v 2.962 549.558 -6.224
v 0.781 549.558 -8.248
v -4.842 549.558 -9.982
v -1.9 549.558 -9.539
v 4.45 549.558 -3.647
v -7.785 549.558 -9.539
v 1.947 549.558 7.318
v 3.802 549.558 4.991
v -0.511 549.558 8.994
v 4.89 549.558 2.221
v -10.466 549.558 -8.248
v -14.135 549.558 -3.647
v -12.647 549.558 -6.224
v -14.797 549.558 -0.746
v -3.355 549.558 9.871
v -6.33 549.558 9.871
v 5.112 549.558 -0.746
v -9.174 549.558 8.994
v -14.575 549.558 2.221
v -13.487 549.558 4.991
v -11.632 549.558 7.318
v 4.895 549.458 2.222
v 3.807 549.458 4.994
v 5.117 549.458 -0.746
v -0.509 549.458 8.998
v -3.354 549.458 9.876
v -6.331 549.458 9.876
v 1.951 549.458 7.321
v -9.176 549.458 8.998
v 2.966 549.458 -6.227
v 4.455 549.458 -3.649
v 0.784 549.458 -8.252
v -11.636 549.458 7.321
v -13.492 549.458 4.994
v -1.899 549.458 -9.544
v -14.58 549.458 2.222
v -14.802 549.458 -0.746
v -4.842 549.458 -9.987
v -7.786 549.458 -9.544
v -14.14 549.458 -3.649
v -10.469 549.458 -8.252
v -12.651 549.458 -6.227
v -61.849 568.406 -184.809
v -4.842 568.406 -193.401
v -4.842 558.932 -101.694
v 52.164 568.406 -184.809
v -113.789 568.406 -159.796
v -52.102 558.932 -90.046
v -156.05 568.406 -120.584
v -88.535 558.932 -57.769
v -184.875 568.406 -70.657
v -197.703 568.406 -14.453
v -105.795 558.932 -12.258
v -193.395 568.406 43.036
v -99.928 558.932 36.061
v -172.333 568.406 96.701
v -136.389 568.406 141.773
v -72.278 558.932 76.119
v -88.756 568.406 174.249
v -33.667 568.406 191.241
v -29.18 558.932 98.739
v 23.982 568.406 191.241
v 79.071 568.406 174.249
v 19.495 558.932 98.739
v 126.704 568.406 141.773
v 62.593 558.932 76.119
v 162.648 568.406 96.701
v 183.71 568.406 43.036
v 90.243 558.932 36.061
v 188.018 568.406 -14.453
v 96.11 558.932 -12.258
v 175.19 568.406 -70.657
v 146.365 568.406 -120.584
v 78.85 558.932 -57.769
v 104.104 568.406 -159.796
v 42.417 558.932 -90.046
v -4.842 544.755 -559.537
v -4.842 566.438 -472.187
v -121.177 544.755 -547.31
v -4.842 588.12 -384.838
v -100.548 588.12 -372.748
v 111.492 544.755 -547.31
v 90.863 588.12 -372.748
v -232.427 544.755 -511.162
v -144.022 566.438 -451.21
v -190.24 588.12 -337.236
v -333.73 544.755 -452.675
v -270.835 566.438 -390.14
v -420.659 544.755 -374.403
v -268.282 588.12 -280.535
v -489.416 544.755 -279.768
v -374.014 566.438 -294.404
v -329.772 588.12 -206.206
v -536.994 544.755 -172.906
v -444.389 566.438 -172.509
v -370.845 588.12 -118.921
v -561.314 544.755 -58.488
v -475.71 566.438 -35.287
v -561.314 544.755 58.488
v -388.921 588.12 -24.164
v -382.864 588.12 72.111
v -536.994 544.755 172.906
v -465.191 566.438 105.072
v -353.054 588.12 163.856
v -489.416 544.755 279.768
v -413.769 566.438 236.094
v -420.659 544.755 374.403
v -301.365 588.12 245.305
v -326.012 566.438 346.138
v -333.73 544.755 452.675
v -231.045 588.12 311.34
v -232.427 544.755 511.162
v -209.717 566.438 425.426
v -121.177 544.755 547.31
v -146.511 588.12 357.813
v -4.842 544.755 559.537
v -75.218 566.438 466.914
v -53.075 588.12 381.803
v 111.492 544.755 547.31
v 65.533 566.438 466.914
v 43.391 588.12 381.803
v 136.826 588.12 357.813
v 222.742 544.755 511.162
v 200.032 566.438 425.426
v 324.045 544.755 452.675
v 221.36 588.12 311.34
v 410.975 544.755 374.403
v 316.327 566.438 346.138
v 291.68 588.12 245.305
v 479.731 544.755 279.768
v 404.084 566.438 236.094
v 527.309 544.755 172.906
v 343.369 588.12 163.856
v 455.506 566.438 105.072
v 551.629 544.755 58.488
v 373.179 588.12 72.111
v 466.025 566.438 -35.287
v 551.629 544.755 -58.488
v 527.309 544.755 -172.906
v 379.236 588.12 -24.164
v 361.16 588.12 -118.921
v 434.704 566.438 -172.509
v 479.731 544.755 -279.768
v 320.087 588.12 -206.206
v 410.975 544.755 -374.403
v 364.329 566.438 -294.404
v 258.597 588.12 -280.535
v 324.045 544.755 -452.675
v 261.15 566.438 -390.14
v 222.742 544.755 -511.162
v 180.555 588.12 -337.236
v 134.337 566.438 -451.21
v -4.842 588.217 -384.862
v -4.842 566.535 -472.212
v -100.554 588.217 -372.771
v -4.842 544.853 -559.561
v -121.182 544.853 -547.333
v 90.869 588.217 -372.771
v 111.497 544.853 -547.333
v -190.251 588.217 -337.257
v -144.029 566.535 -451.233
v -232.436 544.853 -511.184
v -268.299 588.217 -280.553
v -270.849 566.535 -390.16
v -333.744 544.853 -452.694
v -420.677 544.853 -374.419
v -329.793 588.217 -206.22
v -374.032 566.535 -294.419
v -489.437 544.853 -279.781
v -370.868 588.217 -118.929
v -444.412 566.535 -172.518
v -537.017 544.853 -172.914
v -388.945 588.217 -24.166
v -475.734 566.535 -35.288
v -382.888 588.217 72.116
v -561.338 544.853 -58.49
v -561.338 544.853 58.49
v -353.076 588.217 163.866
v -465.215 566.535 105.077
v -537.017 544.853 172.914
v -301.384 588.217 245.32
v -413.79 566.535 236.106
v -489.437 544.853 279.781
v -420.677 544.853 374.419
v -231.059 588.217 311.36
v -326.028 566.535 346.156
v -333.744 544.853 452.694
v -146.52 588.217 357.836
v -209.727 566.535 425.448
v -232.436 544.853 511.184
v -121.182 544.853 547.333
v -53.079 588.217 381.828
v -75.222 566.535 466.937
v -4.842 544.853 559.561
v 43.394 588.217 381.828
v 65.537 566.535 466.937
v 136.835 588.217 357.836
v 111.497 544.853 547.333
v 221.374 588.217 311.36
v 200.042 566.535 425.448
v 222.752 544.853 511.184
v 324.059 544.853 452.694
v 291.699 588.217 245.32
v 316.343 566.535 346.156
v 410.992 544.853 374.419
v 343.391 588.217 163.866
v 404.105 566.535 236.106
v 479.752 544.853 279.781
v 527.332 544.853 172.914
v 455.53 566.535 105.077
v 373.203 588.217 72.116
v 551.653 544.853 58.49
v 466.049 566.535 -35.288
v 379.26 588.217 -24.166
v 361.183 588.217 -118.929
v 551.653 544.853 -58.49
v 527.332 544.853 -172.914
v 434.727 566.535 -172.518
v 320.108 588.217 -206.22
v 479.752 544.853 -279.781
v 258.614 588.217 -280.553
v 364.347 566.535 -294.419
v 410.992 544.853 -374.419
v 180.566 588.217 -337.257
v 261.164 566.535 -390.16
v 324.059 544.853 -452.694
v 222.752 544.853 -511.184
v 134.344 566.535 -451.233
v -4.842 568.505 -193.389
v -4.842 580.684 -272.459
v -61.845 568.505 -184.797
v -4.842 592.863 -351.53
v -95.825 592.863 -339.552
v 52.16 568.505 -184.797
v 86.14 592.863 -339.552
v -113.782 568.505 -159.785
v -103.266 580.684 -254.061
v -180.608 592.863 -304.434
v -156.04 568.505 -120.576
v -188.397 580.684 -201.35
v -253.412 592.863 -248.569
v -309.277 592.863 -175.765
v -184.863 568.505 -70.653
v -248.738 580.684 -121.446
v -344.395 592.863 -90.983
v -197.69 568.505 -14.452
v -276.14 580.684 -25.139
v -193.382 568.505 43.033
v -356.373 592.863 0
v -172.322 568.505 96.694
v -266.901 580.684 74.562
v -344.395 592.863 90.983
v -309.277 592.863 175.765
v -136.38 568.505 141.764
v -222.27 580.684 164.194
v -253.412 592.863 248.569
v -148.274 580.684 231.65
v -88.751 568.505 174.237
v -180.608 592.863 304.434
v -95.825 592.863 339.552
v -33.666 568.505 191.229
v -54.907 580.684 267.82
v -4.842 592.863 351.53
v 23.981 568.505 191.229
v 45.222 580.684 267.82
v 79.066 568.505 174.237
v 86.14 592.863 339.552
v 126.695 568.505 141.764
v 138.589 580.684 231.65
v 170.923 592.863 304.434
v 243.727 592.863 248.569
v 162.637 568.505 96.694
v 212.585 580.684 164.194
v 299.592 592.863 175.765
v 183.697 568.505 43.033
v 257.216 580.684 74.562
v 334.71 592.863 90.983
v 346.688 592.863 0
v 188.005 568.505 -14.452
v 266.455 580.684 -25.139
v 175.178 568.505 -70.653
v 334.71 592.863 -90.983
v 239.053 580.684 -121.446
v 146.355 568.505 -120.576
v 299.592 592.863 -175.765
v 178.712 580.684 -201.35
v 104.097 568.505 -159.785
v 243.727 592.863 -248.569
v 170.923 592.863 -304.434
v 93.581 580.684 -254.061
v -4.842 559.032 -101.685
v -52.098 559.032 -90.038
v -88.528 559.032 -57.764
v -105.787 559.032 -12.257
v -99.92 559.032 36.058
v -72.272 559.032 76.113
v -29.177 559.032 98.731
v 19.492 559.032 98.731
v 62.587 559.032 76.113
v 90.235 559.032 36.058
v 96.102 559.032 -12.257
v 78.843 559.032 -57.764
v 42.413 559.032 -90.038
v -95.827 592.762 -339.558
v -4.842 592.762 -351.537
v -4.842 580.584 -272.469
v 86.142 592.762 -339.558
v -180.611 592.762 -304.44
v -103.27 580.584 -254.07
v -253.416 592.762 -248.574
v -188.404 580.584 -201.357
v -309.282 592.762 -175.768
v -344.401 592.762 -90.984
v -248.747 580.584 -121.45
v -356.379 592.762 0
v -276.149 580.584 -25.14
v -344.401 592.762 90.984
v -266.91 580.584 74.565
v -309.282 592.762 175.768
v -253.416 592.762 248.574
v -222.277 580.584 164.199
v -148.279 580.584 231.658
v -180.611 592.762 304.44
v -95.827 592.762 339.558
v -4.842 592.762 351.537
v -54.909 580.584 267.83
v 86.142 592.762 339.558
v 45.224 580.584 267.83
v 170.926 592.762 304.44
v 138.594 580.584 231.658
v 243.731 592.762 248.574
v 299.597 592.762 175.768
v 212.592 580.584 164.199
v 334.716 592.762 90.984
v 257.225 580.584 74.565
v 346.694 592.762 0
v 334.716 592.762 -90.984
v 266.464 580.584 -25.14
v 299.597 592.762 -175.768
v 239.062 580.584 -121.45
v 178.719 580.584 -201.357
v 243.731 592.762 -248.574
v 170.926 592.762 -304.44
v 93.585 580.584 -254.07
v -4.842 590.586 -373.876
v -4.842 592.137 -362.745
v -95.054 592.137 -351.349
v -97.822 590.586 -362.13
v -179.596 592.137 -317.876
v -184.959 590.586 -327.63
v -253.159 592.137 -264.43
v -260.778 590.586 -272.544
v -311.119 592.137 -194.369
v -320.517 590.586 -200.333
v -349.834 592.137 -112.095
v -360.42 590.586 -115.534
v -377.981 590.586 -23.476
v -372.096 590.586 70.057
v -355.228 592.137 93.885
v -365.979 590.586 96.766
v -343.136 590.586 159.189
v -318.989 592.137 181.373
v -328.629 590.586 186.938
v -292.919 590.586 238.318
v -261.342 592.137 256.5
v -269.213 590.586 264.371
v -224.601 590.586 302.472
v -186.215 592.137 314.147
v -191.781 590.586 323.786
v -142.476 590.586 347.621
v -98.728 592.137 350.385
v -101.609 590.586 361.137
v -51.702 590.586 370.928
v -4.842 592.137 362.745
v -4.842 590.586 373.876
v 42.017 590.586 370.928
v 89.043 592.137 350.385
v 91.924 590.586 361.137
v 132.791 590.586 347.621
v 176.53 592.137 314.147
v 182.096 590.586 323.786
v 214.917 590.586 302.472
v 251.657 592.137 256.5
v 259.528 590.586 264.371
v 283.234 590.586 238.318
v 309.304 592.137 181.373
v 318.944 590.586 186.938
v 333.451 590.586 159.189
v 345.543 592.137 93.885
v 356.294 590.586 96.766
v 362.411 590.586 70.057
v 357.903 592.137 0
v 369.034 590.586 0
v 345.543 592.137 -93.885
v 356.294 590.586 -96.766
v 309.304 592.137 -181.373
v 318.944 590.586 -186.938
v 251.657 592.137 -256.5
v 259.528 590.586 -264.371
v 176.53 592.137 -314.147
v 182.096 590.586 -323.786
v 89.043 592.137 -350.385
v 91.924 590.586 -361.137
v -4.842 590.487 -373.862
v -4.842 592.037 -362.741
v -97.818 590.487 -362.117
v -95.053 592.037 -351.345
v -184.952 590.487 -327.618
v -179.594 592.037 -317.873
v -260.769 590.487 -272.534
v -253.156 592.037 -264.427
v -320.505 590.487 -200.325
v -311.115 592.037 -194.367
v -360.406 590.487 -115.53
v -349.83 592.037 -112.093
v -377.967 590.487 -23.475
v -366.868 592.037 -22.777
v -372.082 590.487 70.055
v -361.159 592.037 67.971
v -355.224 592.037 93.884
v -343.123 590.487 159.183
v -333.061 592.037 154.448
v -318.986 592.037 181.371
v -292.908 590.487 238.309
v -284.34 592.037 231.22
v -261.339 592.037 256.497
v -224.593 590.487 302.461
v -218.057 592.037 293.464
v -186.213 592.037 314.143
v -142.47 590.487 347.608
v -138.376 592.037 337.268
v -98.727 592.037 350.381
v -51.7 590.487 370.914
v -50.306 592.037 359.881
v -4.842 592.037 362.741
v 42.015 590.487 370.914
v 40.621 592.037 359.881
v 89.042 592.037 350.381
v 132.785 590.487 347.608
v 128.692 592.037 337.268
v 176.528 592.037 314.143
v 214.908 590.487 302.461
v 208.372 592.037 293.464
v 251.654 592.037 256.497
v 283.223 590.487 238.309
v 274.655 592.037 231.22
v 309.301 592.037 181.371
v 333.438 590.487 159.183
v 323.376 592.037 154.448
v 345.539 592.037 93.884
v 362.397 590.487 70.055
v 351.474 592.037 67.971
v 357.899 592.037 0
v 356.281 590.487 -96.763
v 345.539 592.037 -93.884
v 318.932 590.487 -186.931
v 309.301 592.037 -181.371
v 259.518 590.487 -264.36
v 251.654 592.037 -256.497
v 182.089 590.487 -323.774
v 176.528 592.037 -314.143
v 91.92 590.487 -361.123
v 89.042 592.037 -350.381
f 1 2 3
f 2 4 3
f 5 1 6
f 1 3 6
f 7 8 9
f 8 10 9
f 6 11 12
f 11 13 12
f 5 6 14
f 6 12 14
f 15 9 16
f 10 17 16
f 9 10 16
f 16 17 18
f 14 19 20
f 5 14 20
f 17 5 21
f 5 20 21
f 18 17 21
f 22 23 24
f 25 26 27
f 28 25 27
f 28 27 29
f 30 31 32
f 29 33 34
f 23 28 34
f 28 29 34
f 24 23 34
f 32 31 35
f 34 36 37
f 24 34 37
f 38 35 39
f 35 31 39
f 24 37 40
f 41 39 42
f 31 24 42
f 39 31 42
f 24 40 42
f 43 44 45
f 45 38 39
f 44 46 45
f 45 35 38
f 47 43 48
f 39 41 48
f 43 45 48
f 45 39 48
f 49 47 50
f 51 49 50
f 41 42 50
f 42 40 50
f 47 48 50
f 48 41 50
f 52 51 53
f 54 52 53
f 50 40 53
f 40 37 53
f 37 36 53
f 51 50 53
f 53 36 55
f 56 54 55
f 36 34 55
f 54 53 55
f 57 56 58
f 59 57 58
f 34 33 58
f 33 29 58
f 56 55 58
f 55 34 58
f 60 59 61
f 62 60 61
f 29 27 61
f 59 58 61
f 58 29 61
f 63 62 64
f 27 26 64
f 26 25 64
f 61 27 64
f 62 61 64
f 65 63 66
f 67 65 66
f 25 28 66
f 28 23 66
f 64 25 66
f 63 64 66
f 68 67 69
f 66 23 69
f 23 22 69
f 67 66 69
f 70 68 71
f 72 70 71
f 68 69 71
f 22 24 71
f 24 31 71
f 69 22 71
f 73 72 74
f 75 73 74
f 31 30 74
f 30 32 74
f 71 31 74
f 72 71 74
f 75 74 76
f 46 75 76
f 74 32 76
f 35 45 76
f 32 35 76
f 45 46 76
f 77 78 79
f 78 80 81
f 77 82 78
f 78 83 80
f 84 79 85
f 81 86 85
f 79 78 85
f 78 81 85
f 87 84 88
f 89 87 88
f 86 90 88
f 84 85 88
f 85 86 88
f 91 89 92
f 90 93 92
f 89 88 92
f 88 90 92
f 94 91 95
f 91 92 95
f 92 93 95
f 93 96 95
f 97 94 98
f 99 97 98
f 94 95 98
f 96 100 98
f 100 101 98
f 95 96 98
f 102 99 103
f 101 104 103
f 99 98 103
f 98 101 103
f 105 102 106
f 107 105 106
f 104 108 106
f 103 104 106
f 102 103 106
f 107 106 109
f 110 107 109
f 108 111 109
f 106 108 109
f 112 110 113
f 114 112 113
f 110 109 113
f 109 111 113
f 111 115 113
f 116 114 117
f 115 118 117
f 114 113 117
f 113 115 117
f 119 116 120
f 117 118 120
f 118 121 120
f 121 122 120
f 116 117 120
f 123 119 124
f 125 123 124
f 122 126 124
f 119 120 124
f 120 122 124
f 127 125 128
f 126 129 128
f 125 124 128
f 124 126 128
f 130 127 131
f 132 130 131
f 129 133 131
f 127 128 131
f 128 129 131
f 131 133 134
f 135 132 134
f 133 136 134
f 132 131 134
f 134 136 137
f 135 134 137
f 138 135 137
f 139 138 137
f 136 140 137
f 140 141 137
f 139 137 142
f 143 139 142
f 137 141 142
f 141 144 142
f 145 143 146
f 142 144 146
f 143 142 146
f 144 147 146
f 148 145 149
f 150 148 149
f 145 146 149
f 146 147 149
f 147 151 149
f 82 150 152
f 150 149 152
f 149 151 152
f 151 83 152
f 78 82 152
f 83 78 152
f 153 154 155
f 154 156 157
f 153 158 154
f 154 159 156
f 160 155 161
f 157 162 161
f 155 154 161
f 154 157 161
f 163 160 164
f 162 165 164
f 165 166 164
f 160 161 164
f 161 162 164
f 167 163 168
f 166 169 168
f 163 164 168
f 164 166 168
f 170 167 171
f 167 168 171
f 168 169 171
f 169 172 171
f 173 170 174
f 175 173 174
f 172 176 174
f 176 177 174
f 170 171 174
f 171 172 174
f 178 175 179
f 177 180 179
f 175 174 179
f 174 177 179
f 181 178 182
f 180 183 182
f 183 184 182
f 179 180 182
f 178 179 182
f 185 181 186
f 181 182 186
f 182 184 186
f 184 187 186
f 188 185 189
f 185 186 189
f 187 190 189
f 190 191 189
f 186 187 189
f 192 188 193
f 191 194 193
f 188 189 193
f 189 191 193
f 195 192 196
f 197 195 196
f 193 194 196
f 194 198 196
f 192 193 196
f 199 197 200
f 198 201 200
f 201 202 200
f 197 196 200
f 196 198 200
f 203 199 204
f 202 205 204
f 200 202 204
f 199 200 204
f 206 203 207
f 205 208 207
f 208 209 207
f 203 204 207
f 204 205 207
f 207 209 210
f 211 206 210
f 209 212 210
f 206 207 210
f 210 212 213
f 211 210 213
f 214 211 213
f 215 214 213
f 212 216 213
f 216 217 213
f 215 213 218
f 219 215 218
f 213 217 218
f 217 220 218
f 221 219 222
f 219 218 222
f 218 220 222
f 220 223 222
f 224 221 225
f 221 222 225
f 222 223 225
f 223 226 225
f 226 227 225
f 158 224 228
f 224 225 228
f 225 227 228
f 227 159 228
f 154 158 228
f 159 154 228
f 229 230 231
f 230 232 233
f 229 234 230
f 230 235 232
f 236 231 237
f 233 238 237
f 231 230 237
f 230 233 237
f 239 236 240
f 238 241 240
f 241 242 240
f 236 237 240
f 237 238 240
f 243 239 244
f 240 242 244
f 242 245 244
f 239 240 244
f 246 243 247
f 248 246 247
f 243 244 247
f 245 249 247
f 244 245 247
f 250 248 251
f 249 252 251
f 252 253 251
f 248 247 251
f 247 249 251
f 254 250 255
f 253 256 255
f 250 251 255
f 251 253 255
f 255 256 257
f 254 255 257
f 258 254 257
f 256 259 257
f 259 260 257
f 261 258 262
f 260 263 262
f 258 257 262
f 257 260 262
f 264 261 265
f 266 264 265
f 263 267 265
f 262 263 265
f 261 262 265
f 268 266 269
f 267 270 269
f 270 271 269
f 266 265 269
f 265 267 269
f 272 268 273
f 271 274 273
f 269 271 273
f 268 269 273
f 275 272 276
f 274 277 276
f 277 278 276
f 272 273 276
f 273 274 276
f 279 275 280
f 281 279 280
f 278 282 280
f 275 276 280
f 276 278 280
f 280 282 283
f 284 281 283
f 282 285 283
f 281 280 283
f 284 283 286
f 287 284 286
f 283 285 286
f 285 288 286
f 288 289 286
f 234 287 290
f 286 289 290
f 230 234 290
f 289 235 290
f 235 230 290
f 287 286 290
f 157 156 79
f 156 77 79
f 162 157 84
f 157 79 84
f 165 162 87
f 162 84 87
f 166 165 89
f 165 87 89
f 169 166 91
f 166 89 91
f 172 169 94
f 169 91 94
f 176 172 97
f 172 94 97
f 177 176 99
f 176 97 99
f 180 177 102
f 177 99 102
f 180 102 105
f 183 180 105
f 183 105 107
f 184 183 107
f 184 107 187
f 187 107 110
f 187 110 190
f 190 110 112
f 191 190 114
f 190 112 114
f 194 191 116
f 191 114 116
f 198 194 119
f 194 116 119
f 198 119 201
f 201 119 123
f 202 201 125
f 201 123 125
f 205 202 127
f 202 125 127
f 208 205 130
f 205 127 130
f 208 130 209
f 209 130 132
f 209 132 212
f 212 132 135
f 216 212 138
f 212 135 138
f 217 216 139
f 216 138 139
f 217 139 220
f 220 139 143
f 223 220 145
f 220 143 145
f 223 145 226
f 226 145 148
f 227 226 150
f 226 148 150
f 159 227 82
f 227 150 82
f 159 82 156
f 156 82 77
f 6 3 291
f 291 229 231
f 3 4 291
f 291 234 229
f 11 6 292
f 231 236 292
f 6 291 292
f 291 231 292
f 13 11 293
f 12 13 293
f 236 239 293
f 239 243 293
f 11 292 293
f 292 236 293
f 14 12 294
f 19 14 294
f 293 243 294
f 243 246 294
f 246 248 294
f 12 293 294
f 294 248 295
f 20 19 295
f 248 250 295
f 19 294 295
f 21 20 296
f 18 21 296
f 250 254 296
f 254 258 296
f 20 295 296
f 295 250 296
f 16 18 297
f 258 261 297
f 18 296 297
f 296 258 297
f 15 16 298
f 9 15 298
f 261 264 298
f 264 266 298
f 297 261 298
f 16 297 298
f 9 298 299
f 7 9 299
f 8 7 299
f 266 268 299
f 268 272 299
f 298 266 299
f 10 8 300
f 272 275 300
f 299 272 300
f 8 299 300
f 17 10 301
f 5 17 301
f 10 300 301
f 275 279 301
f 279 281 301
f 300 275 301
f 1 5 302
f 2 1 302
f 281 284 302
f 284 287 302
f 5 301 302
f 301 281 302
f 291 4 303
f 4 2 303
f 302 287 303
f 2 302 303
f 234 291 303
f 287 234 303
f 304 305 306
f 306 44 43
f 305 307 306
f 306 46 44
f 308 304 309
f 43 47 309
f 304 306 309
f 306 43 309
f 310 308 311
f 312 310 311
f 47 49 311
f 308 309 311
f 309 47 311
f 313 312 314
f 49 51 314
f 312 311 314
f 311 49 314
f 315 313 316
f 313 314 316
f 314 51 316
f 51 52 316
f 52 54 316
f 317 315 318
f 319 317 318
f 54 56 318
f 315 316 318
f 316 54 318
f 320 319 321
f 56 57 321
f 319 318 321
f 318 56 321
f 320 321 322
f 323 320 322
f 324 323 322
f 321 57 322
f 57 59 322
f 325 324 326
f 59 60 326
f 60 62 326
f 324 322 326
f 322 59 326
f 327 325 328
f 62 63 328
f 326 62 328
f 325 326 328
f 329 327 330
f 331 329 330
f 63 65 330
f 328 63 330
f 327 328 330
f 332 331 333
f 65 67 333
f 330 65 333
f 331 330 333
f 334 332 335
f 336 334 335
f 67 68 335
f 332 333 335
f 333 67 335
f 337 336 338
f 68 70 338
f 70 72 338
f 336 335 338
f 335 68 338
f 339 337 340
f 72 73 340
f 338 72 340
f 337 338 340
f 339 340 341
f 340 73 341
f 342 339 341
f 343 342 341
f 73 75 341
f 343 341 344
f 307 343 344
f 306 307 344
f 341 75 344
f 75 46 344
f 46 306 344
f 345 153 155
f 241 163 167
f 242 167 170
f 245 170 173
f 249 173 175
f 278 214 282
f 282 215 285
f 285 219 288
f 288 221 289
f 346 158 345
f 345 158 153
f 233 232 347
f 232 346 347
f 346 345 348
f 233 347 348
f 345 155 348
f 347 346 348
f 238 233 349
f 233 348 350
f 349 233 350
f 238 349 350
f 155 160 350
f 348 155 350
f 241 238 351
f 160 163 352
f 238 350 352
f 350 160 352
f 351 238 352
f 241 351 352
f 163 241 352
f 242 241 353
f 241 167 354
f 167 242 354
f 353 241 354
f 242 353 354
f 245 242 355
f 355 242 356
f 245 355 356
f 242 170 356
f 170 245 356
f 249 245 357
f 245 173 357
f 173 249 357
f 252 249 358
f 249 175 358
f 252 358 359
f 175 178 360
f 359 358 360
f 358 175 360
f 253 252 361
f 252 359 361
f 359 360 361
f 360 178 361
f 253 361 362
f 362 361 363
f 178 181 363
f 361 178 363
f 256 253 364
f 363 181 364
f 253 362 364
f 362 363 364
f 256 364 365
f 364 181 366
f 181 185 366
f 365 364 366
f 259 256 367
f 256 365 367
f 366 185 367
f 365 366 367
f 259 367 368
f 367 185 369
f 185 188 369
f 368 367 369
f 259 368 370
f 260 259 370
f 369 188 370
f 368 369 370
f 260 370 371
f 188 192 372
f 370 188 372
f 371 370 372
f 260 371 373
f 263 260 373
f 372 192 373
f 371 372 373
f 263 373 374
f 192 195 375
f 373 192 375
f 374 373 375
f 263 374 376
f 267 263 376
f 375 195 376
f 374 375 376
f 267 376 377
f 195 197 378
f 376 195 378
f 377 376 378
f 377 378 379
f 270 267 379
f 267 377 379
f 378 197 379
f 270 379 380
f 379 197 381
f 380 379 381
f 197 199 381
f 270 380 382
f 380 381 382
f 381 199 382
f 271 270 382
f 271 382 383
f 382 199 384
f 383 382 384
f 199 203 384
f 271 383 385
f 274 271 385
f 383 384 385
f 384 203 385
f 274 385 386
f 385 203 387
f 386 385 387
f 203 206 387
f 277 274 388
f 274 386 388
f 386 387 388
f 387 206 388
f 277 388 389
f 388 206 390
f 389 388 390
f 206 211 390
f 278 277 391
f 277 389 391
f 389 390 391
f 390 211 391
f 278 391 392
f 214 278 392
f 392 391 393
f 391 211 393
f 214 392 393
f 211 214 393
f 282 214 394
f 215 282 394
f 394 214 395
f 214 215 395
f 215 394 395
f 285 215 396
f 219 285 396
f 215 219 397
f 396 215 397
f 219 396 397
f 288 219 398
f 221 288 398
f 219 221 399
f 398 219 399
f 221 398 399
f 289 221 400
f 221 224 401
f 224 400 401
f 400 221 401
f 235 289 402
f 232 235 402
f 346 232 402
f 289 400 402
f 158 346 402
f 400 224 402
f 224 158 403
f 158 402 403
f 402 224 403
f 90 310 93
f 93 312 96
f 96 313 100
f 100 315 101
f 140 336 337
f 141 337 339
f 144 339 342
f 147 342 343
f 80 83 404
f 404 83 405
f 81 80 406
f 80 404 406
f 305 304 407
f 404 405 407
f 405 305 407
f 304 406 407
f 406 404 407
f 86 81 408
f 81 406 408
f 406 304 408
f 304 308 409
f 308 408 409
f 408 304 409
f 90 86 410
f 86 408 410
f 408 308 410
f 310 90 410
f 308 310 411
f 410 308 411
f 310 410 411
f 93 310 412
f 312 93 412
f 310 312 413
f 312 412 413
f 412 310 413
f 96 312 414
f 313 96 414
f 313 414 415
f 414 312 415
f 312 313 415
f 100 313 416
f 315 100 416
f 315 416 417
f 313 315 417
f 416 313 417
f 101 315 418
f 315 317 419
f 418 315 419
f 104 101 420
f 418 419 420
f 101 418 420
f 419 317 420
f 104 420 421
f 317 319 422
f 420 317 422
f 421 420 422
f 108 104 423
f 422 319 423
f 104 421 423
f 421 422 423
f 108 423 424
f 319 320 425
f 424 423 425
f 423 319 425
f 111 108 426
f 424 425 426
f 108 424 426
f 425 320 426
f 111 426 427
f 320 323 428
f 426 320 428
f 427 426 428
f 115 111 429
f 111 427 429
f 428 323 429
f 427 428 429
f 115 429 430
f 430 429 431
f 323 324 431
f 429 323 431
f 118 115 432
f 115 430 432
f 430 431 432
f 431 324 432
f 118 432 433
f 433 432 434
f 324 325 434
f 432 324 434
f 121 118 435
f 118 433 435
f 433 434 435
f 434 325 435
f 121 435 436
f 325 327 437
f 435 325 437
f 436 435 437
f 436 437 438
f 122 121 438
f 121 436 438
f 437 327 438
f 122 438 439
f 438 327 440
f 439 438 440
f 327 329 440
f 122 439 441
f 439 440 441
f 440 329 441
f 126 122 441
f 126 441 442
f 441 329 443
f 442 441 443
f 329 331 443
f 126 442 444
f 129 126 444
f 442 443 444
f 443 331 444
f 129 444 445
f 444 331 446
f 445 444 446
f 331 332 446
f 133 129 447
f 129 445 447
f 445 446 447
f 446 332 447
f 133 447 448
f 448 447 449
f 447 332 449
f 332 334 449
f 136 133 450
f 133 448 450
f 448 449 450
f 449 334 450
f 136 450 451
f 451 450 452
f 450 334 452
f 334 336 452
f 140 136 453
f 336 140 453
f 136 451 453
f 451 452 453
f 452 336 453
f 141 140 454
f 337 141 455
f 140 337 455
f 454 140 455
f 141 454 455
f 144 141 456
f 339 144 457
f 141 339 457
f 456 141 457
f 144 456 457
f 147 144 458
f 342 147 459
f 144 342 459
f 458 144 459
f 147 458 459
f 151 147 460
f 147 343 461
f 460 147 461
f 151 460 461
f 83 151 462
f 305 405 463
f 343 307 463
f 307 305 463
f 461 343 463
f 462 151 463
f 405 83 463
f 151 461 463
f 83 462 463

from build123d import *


with BuildPart() as part:
    # Schizzo1 → Rivoluzione1 (revolve)
    with BuildSketch(Plane(origin=(0, 0, 0), x_dir=(-1, 0, 0), z_dir=(0, 0, 1)), mode=Mode.PRIVATE) as rivoluzione1_sk:
        with BuildLine():
            Line((-554.694489339, -544.755446129), (-379.995479902, -588.120248731))
            ThreePointArc((-379.995479902, -588.120248731), (-363.473567073, -591.36496946), (-346.694145738, -592.762408471))
            Line((-346.694145738, -592.762408471), (-188.558838555, -568.406205519))
            Line((-188.558838555, -568.406205519), (-5.145007861, -549.45847961))
            Line((-5.145007861, -549.45847961), (4.842484317, -549.45847961))
            Line((4.842484317, -549.45847961), (4.842484317, -549.55847961))
            Line((4.842484317, -549.55847961), (-5.139856275, -549.55847961))
            Line((-5.139856275, -549.55847961), (-188.546081358, -568.505419815))
            Line((-188.546081358, -568.505419815), (-346.687865577, -592.862620368))
            ThreePointArc((-346.687865577, -592.862620368), (-363.482742045, -591.464657333), (-380.01986383, -588.217230765))
            Line((-380.01986383, -588.217230765), (-554.718580803, -544.852500759))
            Line((-554.718580803, -544.852500759), (-554.694489339, -544.755446129))
        make_face()
    revolve(rivoluzione1_sk.sketch.rotate(Axis((-4.842484317, 549.239933768, 0), (0, 1, 0)), 90), axis=Axis((-4.842484317, 549.239933768, 0), (0, 1, 0)))


solid = part.part
